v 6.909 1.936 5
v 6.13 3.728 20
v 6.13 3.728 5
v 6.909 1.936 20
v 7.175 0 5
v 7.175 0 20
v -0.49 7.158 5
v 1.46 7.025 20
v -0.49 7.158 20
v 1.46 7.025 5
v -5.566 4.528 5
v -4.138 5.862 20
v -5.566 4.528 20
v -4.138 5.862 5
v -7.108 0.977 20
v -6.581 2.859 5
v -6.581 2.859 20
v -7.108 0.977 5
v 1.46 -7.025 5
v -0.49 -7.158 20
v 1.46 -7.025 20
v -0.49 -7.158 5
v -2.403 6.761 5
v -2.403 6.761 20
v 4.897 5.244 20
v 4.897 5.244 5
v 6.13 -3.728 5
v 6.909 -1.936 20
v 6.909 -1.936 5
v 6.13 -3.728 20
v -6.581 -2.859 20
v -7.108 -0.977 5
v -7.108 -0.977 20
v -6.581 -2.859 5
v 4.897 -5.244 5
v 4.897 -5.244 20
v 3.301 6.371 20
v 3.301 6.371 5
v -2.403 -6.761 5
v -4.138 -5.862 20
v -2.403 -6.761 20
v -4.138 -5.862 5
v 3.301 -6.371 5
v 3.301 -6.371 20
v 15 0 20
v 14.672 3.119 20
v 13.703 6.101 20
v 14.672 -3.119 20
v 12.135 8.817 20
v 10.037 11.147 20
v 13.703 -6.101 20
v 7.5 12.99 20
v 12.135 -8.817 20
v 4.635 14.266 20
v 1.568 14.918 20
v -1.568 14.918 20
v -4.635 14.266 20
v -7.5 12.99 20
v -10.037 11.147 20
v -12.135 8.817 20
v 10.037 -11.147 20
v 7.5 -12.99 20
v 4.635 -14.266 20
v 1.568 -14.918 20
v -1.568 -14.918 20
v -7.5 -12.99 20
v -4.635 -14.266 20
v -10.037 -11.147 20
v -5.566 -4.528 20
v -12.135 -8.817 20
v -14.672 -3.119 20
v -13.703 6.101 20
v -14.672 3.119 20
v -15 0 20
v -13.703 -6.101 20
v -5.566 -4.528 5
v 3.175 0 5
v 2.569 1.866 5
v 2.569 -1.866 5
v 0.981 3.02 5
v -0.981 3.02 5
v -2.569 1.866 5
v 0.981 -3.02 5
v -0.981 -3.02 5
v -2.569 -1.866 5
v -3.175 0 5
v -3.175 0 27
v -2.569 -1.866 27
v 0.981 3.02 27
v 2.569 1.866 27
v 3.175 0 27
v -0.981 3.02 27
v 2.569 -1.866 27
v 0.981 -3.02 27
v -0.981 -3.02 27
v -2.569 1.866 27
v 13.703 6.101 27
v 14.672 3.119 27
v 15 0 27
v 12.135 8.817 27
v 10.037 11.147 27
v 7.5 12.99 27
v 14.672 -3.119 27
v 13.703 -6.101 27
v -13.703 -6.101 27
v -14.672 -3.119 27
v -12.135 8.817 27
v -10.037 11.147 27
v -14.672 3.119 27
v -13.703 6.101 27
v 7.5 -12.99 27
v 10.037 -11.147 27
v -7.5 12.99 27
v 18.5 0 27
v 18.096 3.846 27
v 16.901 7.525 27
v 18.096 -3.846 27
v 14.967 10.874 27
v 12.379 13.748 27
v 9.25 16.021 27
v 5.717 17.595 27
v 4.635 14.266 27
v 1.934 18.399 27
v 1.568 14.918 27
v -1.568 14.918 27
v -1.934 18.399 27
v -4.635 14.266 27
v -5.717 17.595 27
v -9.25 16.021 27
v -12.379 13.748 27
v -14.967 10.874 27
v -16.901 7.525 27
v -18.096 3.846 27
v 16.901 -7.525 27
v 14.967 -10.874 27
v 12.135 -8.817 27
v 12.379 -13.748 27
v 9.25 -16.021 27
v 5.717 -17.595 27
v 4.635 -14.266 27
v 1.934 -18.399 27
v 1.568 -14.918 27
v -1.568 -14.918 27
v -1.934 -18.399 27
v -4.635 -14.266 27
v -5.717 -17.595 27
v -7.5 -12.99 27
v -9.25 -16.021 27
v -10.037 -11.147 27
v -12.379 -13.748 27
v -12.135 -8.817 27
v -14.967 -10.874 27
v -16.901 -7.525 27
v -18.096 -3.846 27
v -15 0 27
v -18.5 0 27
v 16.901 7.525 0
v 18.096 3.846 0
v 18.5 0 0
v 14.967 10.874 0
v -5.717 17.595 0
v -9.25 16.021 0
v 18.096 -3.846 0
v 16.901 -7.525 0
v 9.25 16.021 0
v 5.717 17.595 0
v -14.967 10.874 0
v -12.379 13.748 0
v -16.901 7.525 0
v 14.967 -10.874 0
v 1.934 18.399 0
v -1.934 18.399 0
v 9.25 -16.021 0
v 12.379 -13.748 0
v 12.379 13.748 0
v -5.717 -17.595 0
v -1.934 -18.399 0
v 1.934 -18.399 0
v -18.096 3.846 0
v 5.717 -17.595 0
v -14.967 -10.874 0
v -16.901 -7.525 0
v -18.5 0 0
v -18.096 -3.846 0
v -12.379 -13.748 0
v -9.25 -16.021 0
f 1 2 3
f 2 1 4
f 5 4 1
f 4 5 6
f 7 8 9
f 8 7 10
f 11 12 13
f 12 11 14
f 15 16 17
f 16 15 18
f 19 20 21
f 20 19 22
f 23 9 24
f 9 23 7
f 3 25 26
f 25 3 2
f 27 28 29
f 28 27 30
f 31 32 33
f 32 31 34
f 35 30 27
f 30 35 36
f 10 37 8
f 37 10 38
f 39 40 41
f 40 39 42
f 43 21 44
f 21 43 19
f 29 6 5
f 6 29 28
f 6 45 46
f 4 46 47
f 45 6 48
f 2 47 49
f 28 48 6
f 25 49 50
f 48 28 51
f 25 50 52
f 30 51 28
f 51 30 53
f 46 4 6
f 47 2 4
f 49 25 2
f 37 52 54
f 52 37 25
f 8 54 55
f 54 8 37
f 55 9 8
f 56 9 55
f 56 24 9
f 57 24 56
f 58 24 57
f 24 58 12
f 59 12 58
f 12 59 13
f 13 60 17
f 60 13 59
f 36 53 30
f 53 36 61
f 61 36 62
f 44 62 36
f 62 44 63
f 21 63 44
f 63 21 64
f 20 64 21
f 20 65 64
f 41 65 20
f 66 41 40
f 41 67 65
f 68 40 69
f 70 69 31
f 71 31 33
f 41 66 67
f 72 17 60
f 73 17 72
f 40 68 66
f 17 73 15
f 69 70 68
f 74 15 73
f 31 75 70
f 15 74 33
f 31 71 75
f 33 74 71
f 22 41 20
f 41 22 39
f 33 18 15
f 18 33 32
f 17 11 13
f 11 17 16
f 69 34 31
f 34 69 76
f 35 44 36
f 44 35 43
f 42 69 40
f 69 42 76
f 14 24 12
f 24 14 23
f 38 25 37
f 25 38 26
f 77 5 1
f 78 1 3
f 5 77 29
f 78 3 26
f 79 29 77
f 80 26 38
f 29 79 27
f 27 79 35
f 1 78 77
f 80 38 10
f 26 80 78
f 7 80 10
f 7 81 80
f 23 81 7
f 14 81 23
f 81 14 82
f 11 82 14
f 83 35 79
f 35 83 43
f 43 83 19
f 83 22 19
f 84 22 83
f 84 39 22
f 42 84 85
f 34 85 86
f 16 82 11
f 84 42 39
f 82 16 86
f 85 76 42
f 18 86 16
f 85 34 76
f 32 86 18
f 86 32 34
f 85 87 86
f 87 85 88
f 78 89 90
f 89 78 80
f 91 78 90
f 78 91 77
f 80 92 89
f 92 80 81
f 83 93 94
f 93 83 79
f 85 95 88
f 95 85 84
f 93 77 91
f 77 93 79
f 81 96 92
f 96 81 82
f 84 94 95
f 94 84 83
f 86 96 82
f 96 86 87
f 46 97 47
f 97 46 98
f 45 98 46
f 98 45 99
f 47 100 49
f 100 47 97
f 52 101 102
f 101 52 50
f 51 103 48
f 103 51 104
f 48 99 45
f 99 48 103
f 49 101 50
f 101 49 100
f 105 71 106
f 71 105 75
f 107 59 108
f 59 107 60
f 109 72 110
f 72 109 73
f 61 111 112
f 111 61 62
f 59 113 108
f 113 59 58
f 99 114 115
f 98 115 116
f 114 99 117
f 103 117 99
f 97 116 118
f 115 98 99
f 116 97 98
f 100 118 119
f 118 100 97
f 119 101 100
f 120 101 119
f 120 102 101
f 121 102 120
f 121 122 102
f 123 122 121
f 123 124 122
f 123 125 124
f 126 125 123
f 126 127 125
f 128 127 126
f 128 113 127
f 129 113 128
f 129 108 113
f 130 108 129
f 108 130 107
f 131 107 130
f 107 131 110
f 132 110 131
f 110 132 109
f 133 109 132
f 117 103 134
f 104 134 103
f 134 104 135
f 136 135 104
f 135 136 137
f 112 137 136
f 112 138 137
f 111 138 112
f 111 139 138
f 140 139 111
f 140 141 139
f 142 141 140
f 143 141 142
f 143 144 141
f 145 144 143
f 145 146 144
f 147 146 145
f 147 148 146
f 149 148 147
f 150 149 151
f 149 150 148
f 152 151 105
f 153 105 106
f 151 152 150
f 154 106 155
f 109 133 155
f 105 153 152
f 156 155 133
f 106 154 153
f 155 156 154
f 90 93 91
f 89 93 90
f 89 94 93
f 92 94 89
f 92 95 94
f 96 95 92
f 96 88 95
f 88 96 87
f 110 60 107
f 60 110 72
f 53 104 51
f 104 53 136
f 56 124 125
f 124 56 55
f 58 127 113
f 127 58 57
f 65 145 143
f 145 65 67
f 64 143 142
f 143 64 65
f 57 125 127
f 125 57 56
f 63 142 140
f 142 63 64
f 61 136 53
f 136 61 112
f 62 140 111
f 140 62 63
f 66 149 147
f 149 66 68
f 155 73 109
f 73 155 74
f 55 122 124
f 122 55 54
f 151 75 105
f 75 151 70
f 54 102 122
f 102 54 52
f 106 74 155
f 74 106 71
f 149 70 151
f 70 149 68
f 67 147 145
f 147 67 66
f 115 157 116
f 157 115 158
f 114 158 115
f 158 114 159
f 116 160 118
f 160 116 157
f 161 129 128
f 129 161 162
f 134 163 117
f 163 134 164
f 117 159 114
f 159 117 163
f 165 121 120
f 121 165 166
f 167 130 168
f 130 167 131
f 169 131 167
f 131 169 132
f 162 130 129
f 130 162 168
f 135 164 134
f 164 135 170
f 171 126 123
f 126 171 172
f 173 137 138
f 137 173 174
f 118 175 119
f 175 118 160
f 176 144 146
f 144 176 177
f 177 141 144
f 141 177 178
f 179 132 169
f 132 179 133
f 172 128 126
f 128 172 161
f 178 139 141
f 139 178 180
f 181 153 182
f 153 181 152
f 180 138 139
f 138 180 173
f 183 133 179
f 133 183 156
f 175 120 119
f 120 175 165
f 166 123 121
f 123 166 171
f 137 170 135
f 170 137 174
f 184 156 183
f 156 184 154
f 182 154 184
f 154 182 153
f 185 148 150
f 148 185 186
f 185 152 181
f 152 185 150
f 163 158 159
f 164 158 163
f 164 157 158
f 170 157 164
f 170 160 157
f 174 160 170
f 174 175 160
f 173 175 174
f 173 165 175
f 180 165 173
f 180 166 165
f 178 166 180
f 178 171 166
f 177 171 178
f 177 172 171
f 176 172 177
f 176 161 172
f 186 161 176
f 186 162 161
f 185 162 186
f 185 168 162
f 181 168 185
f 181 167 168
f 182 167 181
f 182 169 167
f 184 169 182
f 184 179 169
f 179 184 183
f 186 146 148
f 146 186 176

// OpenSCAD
FlangeHeight = 7;
FlangeRadius = 15;
SleeveHeight = 15;
TubingSize = 6.35;
TubingRadius = TubingSize / 2;
SleeveRadius = TubingRadius + 4;
OuterRadius = FlangeRadius + 3.5;
MoldHeight = FlangeHeight + SleeveHeight + 5;
difference() {
cylinder(MoldHeight,OuterRadius,OuterRadius,0);
union() {
translate([0,0,MoldHeight - SleeveHeight - FlangeHeight]){
difference() {
cylinder(SleeveHeight,SleeveRadius,SleeveRadius,0);
    cylinder(SleeveHeight,TubingRadius,TubingRadius,0);
}
}
difference() {
translate([0,0,MoldHeight - FlangeHeight]){
cylinder(FlangeHeight,FlangeRadius,FlangeRadius,0);
}
cylinder(90,TubingRadius,TubingRadius,0);
}
}
}
